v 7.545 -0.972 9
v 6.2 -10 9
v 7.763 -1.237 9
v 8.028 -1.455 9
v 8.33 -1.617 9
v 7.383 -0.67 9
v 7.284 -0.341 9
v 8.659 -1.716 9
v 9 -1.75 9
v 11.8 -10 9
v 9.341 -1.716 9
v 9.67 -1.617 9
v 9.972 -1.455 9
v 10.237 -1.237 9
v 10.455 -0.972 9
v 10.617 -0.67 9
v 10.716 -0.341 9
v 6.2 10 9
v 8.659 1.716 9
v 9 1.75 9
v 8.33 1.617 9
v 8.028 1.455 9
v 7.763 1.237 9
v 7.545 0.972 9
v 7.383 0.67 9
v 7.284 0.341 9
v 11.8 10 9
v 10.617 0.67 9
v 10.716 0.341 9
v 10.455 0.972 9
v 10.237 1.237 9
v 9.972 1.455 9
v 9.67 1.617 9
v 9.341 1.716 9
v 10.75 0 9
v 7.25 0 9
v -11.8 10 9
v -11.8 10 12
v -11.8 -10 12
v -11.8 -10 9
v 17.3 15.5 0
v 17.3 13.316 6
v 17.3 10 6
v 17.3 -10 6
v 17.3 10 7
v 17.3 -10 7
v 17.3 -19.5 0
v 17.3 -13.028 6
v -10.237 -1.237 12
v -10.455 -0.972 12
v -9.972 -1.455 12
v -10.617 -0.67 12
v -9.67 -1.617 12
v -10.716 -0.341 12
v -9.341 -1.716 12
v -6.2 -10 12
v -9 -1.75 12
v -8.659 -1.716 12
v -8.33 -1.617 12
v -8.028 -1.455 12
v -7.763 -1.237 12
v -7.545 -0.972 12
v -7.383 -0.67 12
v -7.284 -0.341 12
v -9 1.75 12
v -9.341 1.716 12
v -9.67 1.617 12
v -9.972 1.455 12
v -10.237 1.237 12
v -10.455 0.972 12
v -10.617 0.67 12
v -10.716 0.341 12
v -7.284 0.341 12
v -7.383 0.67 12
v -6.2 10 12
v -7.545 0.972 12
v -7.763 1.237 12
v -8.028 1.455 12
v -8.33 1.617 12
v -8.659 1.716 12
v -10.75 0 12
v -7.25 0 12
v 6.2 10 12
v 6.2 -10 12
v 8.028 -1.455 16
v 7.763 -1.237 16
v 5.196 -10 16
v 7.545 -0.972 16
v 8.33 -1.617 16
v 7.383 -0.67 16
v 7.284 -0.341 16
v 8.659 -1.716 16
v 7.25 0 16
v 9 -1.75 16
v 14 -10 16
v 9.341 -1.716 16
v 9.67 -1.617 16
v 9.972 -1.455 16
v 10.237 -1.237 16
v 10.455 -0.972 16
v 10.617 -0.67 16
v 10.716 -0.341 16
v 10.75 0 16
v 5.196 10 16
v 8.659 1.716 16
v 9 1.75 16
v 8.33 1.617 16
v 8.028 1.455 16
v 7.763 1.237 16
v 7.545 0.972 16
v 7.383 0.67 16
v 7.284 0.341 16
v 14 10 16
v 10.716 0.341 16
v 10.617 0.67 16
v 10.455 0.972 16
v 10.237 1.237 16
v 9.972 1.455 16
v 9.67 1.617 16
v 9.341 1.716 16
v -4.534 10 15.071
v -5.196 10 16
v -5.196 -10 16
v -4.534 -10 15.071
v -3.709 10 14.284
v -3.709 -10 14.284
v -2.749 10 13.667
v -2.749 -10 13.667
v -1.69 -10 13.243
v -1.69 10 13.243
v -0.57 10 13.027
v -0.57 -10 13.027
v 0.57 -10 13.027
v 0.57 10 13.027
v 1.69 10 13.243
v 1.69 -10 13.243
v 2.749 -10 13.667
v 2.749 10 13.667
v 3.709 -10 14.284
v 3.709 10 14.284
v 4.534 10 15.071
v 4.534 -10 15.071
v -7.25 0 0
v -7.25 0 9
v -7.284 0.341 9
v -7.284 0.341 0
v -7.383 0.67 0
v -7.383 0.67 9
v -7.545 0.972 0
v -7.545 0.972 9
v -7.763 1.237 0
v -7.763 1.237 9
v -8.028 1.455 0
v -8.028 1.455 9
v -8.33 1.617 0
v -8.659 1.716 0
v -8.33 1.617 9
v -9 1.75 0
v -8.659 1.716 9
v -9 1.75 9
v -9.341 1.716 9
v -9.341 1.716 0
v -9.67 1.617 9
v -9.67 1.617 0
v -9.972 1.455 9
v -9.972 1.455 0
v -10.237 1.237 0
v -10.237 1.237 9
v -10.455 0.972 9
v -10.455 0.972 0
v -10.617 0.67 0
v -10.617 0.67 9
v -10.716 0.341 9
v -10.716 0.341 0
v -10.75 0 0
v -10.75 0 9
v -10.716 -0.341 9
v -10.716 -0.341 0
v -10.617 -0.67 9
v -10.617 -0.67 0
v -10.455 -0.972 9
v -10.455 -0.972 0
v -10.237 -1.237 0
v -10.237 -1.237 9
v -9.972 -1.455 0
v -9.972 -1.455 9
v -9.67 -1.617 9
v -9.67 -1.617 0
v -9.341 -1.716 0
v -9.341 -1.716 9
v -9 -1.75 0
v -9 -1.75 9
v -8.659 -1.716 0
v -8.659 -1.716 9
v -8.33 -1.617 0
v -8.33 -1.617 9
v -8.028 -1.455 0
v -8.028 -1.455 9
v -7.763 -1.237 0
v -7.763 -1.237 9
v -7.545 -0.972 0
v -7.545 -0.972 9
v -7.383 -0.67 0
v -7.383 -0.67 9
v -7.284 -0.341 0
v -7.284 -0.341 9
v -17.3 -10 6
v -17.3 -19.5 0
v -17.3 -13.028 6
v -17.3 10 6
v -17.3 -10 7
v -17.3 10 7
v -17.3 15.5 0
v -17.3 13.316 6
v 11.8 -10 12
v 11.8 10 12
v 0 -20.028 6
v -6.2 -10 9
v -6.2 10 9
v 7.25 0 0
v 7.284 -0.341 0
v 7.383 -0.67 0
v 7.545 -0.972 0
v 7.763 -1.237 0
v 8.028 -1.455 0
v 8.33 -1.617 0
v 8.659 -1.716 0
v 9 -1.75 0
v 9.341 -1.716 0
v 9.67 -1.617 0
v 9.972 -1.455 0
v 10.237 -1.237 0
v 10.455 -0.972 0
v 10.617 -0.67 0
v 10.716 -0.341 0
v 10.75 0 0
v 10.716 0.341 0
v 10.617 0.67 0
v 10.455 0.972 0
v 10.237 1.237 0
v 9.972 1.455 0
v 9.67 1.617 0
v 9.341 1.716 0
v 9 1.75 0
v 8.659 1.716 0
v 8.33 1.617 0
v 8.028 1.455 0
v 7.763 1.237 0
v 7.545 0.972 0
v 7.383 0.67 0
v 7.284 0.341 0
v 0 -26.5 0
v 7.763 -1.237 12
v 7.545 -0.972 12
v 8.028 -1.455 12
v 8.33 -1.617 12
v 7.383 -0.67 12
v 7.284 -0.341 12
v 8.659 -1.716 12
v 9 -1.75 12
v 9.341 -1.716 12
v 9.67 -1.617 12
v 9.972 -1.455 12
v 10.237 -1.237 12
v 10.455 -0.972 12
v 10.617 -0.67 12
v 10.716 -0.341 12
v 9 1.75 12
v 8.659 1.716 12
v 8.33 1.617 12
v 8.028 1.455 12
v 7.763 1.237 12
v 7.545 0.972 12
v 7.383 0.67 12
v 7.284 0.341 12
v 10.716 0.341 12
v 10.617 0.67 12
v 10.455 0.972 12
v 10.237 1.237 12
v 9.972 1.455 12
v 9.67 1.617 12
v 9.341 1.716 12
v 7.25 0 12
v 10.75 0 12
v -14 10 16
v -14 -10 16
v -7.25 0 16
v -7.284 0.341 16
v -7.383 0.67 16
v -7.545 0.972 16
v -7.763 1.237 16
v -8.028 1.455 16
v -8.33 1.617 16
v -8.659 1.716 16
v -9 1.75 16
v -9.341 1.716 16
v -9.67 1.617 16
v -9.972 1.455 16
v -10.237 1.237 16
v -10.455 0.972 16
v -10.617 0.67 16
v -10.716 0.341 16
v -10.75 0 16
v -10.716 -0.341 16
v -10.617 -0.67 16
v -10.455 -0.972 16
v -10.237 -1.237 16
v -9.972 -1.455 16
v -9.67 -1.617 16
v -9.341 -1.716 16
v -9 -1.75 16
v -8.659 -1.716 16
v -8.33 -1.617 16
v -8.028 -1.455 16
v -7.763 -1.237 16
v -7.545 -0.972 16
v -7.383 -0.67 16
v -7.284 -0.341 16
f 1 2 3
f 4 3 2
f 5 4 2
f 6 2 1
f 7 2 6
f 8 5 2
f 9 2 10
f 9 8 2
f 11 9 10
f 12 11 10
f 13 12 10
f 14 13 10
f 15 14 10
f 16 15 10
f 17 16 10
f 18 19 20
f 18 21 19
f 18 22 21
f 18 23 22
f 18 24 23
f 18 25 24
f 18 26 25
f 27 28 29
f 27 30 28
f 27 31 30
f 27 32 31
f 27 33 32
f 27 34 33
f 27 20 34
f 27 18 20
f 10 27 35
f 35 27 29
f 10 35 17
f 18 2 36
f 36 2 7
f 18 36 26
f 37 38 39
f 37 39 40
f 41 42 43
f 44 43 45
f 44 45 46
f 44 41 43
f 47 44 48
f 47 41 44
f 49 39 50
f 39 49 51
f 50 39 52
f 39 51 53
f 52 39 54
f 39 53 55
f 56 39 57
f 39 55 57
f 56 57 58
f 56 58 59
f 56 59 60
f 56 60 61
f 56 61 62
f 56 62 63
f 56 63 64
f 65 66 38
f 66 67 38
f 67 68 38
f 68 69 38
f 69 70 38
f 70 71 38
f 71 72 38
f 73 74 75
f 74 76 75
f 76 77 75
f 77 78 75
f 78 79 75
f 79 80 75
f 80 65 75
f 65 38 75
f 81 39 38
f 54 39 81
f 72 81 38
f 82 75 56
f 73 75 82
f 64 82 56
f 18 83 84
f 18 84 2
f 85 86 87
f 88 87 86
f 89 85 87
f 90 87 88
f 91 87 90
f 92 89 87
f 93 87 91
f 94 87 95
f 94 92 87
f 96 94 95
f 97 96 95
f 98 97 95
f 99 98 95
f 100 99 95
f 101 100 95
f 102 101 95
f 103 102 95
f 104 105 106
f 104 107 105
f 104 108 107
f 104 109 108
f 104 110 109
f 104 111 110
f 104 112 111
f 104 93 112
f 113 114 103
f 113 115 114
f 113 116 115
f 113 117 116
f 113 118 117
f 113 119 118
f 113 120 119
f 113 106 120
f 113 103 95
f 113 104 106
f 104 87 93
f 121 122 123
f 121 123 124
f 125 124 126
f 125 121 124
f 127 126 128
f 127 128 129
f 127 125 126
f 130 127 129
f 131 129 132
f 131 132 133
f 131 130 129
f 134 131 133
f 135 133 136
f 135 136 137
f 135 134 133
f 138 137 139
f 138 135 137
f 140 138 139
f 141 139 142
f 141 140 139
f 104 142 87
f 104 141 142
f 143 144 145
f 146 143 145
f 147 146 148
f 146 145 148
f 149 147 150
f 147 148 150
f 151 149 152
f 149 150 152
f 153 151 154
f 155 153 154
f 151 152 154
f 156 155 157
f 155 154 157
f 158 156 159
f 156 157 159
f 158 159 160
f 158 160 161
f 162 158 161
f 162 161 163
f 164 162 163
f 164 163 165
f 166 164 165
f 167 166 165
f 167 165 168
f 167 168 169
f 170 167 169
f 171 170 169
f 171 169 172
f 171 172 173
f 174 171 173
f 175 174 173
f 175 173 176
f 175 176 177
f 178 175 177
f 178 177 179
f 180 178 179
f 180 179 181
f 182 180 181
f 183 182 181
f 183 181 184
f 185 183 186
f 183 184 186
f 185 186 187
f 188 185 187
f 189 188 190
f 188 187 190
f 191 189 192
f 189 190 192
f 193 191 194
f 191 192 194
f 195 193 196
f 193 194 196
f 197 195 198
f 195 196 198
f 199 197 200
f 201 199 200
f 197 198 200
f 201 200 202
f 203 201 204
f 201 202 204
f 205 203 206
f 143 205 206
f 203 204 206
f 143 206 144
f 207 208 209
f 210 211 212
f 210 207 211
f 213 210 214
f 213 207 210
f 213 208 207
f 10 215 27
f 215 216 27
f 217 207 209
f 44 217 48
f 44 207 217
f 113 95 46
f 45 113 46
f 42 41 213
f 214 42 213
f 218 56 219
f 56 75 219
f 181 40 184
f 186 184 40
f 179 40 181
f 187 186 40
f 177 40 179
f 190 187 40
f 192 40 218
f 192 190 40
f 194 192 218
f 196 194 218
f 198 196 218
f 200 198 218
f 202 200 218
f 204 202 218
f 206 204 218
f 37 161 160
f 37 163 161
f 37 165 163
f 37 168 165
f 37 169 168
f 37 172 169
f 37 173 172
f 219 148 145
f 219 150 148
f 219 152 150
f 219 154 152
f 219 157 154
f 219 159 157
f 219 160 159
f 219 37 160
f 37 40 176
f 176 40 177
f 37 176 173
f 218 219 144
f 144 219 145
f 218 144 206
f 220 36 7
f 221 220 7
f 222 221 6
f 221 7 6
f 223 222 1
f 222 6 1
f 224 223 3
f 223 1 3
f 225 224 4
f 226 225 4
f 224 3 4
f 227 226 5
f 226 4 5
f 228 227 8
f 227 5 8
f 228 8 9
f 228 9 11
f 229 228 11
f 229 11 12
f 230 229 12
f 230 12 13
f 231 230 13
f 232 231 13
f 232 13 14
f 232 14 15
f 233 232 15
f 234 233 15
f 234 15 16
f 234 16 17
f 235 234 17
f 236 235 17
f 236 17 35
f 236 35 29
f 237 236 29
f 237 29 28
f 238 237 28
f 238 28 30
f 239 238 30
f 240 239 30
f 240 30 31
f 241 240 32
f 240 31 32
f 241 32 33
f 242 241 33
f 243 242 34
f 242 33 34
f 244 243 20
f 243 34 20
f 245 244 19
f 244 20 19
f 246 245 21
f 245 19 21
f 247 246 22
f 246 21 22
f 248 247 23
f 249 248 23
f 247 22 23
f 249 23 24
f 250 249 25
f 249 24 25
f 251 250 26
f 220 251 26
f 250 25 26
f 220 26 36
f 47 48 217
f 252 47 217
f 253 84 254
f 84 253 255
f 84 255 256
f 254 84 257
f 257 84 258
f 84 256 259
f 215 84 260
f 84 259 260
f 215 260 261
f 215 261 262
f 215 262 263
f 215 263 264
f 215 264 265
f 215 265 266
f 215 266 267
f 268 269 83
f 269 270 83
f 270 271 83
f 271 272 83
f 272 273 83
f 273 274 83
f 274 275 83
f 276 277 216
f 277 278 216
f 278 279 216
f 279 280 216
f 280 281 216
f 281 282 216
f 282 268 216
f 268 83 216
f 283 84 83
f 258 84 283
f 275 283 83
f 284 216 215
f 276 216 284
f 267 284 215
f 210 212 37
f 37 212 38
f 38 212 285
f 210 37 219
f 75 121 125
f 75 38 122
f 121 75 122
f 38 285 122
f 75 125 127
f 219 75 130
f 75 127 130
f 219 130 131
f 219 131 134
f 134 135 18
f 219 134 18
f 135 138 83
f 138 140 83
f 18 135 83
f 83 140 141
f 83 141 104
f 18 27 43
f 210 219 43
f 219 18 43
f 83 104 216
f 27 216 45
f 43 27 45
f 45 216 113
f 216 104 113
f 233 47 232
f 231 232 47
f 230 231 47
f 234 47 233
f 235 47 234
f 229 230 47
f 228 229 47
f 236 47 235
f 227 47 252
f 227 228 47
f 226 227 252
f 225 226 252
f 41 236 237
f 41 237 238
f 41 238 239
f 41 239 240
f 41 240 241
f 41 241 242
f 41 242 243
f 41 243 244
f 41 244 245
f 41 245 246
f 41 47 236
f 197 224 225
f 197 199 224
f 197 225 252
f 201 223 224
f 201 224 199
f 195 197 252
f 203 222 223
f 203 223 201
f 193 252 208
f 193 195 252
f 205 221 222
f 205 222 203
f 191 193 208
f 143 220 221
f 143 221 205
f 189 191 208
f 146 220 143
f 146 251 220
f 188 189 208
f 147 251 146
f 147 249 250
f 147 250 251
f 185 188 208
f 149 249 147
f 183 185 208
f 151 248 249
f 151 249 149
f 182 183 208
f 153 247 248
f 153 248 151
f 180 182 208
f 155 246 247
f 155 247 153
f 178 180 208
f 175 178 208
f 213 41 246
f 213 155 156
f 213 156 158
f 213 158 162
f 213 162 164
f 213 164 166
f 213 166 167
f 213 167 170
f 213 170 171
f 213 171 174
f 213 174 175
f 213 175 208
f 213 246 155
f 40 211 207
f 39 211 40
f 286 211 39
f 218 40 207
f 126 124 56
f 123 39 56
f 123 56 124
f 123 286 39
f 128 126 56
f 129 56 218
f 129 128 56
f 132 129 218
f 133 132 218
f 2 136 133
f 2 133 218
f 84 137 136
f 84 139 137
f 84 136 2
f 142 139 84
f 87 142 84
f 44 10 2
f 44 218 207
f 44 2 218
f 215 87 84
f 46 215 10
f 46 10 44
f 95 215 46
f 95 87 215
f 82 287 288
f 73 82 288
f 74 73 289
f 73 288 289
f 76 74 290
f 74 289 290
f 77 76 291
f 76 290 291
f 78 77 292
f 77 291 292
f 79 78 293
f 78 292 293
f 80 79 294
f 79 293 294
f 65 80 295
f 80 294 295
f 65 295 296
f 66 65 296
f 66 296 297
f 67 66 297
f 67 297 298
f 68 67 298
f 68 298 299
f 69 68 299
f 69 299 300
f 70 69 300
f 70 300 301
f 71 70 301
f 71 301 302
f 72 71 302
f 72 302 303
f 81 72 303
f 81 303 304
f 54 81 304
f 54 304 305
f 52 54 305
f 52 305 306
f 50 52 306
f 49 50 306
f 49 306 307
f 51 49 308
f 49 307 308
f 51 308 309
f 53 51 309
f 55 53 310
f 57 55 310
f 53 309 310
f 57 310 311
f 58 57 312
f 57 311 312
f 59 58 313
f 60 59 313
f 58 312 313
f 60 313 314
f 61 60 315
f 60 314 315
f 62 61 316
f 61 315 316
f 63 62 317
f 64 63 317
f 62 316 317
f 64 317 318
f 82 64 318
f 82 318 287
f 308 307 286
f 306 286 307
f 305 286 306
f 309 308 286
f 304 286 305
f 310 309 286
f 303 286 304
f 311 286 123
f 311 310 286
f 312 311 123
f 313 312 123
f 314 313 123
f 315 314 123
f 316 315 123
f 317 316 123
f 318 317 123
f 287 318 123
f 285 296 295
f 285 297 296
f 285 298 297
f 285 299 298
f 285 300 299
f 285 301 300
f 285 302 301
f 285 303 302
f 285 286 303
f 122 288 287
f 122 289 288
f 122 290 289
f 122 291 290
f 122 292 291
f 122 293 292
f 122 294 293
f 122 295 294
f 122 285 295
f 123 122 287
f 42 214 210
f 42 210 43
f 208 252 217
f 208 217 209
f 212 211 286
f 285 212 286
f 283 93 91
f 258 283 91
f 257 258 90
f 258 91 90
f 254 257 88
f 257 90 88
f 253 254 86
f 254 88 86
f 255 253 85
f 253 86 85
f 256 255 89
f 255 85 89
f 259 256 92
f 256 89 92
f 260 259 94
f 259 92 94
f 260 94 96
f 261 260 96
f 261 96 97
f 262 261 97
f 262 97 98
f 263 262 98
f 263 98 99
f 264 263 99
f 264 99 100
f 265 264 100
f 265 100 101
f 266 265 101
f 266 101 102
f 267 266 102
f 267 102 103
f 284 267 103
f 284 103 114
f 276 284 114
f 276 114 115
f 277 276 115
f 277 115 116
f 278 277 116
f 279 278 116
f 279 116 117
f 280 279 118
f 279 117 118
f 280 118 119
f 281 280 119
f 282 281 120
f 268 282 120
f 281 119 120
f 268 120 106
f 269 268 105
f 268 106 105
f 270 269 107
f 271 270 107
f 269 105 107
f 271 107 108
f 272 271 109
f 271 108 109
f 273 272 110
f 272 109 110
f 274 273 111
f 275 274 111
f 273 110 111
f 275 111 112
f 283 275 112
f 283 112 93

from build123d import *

# Parameters (mm, degrees)
ESBO_O1_W                = 34.6
ESBO_O1_H                = 26
RESSALTO_EXTRUS_O1_DEPTH = 7
ESBO_O10_W               = 34.6
ESBO_O10_H               = 2.5
RESSALTO_EXTRUS_O4_DEPTH = 7
CHANFRO1_SIZE            = 7
CHANFRO2_SIZE2           = 7
CHANFRO2_SIZE            = 2.54779164
ESBO_O11_W               = 5.6
ESBO_O11_H               = 3
RESSALTO_EXTRUS_O5_DEPTH = 10
ESBO_O12_R               = 1.75
CORTE_EXTRUS_O1_DEPTH    = 20
ESBO_O13_W               = 34.6
ESBO_O13_H               = 5.5
ESBO_O13_H_2             = 18.393079324
CORTE_EXTRUS_O2_DEPTH    = 1


with BuildPart() as part:
    # Esboço1 → Ressalto-extrusão1 (new body)
    with BuildSketch(Plane.XY):
        Rectangle(ESBO_O1_W, ESBO_O1_H)
    extrude(amount=RESSALTO_EXTRUS_O1_DEPTH)

    # Esboço10 → Ressalto-extrusão4 (add)
    with BuildSketch(Plane(origin=(0, 0, 0), x_dir=(-1, 0, 0), z_dir=(0, 0, -1))):
        Polygon((-17.3, -19.5), (0, -26.5), (17.3, -19.5), (17.3, -13), (-17.3, -13), align=None)
        with Locations((0, 14.25)):
            Rectangle(ESBO_O10_W, ESBO_O10_H)
    extrude(amount=-RESSALTO_EXTRUS_O4_DEPTH)

    # Chanfro1
    chanfro1_edges = [part.edges().sort_by_distance(p)[0] for p in [
        (8.65, -23, 7),
        (-8.65, -23, 7),
    ]]
    chamfer(chanfro1_edges, length=CHANFRO1_SIZE - 0.0001)  # a hair under: the kernel refuses the full size

    # Chanfro2
    chanfro2_edges = [part.edges().sort_by_distance(p)[0] for p in [
        (0, 15.5, 7),
    ]]
    chanfro2_side = [part.faces().sort_by_distance(p)[0] for p in [
        (0, 15.449044167, 7),
    ]]
    chamfer(chanfro2_edges, length=CHANFRO2_SIZE - 0.0001, length2=CHANFRO2_SIZE2 - 0.0001, reference=chanfro2_side[0])  # a hair under: the kernel refuses the full size

    # Esboço11 → Ressalto-extrusão5 (add, symmetric)
    with BuildSketch(Plane(origin=(0, 0, 0), x_dir=(1, 0, 0), z_dir=(0, 1, 0))):
        with BuildLine():
            Line((-17.3, -7), (-14, -16))
            Line((-14, -16), (-5.196152423, -16))
            ThreePointArc((-5.196152423, -16), (0, -13), (5.196152423, -16))
            Line((5.196152423, -16), (14, -16))
            Line((14, -16), (17.3, -7))
            Line((17.3, -7), (-17.3, -7))
        make_face()
        with Locations((-9, -10.5)):
            Rectangle(ESBO_O11_W, ESBO_O11_H, mode=Mode.SUBTRACT)
        with Locations((9, -10.5)):
            Rectangle(ESBO_O11_W, ESBO_O11_H, mode=Mode.SUBTRACT)
    extrude(amount=RESSALTO_EXTRUS_O5_DEPTH, both=True)

    # Esboço12 → Corte-extrusão1 (cut)
    with BuildSketch(Plane.XY.offset(16)):
        with Locations((-9, 0)):
            Circle(ESBO_O12_R)
        with Locations(Location((9, 0, 0), (0, 0, 180))):
            Circle(ESBO_O12_R)
    extrude(amount=-CORTE_EXTRUS_O1_DEPTH, mode=Mode.SUBTRACT)

    # Esboço13 → Corte-extrusão2 (cut)
    with BuildSketch(Plane.XY.offset(7)):
        with Locations((0, 12.75)):
            Rectangle(ESBO_O13_W, ESBO_O13_H)
        with Locations((0, -19.196539662)):
            Rectangle(ESBO_O13_W, ESBO_O13_H_2)
    extrude(amount=-CORTE_EXTRUS_O2_DEPTH, mode=Mode.SUBTRACT)


solid = part.part
